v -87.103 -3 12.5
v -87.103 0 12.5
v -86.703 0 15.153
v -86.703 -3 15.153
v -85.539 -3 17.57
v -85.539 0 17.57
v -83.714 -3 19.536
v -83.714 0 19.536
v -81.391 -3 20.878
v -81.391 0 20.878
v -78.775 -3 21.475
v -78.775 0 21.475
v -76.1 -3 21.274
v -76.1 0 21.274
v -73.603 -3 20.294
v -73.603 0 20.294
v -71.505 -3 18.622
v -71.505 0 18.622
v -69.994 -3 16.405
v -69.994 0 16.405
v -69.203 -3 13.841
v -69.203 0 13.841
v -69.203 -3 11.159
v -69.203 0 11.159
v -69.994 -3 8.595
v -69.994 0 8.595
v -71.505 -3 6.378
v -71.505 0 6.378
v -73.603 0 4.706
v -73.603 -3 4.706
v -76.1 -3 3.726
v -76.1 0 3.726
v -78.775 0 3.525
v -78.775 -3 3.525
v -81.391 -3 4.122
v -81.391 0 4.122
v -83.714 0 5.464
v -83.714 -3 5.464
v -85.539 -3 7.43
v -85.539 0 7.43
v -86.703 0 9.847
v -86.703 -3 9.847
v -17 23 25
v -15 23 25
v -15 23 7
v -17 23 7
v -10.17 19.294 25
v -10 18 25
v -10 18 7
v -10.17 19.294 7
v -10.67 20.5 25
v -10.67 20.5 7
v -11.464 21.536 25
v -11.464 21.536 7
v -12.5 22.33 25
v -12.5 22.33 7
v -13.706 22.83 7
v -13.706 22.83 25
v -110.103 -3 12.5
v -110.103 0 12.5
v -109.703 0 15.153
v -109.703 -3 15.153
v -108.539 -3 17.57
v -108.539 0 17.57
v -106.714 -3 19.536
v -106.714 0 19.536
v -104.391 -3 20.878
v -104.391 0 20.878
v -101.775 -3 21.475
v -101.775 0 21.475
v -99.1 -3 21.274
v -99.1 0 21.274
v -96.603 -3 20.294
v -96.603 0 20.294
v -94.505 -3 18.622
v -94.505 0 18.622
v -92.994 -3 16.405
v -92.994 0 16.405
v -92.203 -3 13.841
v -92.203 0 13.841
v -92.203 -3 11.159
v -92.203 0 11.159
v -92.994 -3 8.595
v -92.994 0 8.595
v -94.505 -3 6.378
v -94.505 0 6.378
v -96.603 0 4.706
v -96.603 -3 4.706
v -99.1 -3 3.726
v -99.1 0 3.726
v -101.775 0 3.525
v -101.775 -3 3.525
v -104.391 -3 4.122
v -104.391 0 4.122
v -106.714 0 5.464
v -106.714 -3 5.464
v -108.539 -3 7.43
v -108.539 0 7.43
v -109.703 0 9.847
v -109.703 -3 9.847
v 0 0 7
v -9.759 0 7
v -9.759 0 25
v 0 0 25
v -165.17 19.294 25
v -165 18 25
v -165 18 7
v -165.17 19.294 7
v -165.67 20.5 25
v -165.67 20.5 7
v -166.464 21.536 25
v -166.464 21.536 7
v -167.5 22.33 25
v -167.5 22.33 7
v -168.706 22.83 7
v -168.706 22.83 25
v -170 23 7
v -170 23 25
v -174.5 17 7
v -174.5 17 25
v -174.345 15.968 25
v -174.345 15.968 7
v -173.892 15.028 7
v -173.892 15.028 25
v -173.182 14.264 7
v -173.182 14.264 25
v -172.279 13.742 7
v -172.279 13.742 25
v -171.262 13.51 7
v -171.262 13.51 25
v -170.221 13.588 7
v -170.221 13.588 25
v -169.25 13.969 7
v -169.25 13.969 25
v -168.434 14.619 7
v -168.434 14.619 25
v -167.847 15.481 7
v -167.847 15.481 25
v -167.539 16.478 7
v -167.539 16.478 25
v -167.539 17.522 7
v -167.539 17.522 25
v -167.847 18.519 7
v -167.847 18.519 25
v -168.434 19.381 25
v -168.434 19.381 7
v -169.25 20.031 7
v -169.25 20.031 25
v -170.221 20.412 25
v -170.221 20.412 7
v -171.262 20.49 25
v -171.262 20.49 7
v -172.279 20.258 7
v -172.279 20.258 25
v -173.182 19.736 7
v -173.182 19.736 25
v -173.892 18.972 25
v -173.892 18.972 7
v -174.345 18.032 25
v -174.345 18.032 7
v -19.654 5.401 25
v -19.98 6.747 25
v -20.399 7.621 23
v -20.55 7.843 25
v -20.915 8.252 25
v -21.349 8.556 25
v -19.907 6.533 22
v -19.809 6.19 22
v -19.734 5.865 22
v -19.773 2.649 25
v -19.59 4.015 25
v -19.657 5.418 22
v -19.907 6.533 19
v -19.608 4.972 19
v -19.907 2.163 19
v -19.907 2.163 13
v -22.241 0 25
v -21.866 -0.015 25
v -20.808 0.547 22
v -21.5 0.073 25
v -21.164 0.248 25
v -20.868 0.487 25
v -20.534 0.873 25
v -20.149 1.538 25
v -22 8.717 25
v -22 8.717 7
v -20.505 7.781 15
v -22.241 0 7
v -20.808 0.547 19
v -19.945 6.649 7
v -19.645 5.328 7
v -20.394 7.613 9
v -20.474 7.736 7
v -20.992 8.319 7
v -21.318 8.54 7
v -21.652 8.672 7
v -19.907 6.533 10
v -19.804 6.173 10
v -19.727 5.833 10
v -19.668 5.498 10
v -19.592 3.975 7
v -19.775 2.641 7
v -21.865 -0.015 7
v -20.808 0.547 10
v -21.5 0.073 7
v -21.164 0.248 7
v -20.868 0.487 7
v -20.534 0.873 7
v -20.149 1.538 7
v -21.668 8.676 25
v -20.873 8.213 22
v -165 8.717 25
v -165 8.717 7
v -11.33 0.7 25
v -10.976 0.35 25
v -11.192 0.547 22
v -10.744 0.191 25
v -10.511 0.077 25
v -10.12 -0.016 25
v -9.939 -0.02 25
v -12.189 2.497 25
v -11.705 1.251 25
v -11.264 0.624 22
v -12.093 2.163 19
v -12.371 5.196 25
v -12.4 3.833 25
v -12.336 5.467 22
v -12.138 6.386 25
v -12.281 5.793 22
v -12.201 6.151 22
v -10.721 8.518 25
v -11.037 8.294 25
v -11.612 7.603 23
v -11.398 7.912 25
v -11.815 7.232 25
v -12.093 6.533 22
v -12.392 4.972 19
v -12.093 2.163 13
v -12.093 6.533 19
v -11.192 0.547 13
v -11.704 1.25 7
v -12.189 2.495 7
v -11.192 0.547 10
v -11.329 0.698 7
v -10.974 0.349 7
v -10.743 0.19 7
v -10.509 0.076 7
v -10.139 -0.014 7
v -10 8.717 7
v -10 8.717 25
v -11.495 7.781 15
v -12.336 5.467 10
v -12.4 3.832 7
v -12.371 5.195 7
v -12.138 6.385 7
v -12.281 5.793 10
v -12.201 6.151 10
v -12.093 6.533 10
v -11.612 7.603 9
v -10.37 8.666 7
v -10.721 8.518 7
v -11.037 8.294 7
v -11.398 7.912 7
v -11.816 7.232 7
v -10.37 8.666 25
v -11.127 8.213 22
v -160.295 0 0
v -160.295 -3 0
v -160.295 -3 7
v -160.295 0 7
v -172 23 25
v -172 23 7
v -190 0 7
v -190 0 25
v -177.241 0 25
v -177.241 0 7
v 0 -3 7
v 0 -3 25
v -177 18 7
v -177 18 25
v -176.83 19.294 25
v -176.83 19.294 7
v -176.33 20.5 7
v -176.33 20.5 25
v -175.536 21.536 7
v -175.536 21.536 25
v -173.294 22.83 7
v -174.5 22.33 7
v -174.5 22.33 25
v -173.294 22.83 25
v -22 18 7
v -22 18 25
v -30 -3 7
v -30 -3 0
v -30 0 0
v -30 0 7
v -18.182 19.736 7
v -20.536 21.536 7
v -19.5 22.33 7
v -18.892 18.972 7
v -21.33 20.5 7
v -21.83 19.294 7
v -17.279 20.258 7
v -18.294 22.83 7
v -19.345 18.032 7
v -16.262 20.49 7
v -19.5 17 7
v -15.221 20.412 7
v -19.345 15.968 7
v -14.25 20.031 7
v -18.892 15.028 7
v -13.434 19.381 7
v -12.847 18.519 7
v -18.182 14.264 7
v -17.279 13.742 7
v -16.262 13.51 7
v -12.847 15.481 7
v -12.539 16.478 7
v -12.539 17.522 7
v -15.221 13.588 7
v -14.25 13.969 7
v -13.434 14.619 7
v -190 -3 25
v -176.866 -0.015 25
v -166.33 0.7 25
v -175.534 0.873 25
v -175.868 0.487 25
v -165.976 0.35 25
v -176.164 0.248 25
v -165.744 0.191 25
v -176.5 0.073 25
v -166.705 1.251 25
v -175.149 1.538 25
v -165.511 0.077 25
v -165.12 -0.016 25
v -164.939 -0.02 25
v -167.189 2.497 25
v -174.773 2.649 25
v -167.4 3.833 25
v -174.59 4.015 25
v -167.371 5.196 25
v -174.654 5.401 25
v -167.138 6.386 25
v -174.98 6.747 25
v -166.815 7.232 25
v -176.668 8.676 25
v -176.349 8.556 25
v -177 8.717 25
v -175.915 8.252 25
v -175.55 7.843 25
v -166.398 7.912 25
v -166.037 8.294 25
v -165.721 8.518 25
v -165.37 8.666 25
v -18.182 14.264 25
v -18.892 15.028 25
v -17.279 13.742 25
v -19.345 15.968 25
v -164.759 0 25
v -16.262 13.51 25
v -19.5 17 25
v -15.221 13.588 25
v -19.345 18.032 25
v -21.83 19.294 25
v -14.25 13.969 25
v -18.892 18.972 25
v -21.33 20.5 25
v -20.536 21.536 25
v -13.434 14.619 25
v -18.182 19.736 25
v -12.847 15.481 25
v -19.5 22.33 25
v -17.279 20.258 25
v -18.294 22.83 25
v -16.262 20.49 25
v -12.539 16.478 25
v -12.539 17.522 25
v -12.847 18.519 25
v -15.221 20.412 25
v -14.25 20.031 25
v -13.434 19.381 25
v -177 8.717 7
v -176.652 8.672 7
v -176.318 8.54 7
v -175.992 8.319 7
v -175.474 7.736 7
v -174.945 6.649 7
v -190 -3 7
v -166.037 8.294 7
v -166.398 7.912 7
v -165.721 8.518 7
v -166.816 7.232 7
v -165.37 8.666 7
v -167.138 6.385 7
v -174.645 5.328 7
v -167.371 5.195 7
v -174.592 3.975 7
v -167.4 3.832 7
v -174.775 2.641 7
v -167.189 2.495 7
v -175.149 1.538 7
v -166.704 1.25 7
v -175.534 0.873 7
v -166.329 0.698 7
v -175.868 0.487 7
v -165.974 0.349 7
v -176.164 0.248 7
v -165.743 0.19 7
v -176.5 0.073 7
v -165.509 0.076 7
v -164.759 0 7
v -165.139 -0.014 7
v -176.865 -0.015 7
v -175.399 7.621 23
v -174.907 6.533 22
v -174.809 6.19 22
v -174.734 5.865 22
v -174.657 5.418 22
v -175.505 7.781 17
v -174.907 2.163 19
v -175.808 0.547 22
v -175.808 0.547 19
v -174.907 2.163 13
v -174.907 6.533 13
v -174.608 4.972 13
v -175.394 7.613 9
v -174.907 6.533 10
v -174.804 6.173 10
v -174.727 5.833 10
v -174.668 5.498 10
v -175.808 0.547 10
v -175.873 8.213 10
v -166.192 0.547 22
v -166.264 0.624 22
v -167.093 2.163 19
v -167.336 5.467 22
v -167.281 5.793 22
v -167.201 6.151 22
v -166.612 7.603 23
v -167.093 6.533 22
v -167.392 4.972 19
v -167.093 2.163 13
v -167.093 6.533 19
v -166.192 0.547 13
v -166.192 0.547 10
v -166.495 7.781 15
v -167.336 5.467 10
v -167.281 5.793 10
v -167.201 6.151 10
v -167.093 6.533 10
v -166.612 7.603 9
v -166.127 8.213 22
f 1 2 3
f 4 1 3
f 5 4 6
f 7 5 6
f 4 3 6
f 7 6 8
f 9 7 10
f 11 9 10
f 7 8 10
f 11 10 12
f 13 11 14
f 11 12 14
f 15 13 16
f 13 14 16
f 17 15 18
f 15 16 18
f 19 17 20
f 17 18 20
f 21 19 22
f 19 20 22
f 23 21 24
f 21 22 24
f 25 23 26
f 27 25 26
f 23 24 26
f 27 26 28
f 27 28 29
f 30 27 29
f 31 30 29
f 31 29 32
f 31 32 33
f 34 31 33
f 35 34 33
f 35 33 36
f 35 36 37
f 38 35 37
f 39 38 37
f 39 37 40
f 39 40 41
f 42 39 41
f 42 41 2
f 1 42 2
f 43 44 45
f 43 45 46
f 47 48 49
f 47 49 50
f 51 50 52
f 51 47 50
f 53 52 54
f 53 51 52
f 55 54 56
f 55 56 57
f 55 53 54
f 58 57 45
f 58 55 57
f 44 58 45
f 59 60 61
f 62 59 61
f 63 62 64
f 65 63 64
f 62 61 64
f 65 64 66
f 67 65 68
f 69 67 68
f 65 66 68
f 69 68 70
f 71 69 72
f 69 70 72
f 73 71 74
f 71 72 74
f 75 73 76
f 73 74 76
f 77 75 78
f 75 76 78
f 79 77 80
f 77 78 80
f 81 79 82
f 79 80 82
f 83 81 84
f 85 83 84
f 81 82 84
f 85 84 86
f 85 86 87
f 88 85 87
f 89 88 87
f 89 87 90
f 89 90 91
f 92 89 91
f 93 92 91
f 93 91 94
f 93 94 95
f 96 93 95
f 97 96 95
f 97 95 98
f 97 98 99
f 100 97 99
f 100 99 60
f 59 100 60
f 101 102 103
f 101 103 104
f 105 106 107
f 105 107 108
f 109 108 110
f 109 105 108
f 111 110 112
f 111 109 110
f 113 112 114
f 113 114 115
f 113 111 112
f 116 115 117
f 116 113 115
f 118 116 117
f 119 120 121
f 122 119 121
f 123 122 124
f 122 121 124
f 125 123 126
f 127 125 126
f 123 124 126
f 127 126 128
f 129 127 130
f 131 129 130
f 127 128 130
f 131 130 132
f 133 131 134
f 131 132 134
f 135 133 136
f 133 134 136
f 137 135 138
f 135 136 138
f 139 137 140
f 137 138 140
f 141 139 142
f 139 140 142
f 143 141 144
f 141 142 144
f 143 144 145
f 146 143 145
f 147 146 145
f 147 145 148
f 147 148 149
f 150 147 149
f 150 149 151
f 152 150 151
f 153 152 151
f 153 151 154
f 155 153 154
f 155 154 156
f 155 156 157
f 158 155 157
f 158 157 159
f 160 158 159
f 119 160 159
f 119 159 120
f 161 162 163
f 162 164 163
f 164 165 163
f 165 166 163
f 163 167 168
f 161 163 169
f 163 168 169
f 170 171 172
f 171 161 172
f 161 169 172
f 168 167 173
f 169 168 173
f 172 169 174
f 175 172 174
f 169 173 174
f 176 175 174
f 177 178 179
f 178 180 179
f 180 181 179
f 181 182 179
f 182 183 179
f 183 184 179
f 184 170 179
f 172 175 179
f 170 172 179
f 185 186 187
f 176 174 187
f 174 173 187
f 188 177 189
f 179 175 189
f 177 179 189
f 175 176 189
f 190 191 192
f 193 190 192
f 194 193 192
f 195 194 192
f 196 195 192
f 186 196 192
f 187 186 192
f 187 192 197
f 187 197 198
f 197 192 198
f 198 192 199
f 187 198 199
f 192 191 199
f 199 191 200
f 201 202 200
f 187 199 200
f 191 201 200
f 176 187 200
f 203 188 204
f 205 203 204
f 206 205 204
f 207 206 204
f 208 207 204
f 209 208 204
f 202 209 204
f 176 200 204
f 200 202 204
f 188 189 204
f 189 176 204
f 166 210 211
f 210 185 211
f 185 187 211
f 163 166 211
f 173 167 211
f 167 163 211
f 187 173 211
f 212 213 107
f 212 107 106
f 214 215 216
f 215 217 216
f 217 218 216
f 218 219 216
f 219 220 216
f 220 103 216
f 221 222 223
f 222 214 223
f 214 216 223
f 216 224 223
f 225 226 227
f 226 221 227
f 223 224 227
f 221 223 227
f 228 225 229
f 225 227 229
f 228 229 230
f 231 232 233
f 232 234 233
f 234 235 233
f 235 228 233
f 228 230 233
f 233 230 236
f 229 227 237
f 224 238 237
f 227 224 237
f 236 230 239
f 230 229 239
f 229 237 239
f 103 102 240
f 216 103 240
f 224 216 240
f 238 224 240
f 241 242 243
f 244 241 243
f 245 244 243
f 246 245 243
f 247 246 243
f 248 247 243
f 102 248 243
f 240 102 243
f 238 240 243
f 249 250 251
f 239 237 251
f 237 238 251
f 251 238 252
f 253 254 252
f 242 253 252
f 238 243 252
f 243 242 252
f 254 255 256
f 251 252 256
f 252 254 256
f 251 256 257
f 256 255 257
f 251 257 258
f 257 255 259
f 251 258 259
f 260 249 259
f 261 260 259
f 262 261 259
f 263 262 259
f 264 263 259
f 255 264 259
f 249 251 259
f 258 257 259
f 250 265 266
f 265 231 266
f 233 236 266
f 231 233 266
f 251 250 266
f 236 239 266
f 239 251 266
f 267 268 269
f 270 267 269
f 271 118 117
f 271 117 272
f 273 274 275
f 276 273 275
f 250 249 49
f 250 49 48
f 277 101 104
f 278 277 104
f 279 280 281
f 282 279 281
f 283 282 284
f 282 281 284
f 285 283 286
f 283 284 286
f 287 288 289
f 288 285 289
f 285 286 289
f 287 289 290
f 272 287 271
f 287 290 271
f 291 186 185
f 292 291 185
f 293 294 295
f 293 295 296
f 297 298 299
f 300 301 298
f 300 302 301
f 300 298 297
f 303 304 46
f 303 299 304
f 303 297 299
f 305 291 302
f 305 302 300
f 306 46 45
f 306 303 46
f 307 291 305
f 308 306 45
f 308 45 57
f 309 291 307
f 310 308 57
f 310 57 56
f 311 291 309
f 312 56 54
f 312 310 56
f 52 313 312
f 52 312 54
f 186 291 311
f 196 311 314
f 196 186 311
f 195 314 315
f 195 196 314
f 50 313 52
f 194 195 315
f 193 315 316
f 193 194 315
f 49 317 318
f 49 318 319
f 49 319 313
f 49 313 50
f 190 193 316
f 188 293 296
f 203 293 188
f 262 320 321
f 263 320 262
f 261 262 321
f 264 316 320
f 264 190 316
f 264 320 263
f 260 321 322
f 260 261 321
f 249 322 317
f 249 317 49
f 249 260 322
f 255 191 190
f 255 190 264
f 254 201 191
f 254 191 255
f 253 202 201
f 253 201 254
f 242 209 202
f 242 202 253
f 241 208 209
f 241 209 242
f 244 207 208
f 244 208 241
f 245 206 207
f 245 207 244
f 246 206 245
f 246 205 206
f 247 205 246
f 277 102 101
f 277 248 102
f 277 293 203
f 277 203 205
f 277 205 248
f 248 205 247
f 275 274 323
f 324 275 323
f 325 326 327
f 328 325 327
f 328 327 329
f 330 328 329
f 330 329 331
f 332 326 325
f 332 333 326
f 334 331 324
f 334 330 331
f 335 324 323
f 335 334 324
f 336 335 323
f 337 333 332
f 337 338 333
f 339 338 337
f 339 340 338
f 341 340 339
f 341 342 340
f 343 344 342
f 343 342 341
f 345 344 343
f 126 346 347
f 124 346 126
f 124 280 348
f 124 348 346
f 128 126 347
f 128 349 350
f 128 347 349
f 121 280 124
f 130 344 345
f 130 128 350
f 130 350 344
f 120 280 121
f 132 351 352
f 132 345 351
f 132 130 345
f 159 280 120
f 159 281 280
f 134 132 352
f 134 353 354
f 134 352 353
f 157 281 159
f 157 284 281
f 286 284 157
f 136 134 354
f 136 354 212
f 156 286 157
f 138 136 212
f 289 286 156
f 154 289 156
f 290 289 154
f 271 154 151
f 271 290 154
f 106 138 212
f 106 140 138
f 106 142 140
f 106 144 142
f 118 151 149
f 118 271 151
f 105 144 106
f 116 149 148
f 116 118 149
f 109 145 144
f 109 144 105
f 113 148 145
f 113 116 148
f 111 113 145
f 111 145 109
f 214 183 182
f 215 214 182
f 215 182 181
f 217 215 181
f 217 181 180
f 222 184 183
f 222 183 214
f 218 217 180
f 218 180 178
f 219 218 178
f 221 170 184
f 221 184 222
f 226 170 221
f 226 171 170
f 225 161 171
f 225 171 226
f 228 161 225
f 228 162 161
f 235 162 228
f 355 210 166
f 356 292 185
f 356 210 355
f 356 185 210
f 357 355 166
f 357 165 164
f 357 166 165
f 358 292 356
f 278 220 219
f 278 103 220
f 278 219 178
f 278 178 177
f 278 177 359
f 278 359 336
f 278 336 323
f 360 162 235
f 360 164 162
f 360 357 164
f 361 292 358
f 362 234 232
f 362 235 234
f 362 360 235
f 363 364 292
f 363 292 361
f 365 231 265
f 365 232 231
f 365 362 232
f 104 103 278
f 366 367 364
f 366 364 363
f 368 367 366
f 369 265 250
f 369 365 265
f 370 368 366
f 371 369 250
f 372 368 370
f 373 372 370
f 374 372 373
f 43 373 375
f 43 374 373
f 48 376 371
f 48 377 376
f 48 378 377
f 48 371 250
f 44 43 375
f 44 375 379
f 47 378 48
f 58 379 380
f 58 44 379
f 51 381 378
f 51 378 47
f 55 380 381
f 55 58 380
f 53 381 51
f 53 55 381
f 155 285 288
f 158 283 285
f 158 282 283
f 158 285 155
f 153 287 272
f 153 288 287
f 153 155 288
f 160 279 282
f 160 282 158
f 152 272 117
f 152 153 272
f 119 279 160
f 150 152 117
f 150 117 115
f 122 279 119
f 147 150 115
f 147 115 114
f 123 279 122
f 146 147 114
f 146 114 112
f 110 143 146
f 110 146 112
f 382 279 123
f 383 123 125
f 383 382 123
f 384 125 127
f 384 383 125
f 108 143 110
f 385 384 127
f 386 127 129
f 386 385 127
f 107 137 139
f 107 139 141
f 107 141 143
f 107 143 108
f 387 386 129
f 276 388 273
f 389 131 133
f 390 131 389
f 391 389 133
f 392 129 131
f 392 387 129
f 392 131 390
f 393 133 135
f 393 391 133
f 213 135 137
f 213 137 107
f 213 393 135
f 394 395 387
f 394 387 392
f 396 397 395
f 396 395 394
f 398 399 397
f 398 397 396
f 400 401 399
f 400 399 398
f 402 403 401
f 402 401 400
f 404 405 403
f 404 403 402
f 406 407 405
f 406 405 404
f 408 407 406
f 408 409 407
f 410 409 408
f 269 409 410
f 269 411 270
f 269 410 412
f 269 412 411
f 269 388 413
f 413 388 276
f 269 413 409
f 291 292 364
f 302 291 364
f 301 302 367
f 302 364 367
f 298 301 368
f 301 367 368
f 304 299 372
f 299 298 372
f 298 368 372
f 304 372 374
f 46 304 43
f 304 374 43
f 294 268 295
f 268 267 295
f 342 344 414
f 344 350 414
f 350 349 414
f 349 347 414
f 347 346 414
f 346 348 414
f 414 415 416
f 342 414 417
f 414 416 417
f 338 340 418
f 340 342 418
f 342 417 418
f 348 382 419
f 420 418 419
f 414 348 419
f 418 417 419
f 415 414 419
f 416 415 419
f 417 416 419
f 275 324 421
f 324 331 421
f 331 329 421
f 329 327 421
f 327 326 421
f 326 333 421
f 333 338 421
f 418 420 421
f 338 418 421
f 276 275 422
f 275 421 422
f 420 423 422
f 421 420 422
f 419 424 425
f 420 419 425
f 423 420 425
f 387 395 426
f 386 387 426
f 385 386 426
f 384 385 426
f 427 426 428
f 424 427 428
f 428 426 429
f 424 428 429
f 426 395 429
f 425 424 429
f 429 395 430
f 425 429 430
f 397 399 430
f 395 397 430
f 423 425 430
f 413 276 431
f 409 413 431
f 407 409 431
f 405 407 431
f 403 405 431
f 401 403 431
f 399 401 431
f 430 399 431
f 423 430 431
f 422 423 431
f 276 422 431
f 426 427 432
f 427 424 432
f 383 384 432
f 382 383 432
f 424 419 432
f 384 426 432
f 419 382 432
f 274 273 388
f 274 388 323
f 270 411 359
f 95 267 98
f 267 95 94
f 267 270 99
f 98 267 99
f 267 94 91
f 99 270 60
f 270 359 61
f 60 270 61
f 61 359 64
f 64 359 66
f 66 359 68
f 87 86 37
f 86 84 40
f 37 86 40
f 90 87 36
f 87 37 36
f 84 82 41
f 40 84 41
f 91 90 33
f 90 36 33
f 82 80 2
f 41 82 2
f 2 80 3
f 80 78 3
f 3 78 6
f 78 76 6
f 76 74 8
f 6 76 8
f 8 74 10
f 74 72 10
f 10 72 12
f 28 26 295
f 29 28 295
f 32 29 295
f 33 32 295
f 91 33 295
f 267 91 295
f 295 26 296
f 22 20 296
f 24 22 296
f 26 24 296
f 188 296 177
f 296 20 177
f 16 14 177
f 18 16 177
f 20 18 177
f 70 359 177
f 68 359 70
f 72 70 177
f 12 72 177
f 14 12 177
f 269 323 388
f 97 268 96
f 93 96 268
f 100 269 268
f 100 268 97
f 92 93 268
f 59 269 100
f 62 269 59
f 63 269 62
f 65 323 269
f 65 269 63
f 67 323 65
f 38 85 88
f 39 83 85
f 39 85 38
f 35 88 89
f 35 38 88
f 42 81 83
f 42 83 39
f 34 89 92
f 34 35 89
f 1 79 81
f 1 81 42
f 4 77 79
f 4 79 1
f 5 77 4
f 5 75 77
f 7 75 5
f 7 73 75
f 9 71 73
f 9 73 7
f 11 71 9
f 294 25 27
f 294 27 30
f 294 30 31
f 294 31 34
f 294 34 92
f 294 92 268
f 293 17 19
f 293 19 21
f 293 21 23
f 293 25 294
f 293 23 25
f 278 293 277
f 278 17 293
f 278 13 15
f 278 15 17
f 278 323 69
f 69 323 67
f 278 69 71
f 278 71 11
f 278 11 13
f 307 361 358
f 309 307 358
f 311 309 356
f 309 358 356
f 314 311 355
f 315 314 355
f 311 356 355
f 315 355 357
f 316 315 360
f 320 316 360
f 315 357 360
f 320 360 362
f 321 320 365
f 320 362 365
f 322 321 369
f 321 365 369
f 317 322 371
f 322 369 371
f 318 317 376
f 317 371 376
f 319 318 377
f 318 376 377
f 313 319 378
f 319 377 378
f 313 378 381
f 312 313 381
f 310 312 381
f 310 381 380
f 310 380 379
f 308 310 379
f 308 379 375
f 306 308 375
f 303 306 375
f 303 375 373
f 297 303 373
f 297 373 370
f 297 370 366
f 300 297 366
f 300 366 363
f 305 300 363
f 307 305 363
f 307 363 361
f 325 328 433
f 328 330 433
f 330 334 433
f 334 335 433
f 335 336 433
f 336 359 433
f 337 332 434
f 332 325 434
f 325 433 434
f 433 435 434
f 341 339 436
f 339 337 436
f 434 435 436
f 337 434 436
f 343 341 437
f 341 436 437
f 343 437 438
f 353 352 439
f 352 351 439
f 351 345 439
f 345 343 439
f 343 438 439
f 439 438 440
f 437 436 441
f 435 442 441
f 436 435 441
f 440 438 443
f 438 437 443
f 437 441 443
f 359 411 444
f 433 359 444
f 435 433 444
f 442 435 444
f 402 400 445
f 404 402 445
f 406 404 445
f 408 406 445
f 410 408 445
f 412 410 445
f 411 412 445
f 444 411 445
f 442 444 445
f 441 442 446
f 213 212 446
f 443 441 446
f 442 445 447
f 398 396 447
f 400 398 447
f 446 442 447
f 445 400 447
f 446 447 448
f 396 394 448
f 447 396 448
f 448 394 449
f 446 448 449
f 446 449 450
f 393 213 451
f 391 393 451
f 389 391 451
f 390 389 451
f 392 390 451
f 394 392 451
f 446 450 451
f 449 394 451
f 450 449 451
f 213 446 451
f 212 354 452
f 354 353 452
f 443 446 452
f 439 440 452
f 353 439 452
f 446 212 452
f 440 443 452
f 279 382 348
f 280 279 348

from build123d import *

# Parameters (mm, degrees)
F0_W      = 190
F0_H      = 25
F1_DEPTH  = 3
F3_D      = 18
F4_D      = 18
F5_W      = 12
F5_H      = 25
F6_DEPTH  = 23
F7_R      = 5
F9_D      = 7
F11_DEPTH = 50
F12_DEPTH = 25.4
F13_W     = 30
F13_H     = 7
F13_W_2   = 29.7052872181
F14_DEPTH = 70


with BuildPart() as f1:
    # F0 (on Front) → F1 (new body)
    with BuildSketch(Plane.XZ):
        with Locations((-95, 12.5)):
            Rectangle(F0_W, F0_H)
    extrude(amount=F1_DEPTH)

    # F3 (through all)
    with Locations(Plane.XZ.offset(3)):
        with Locations((-78.1028885841, 12.5)):
            Hole(F3_D / 2)

    # F4 (through all)
    with Locations(Plane.XZ.offset(3)):
        with Locations((-101.1028885841, 12.5)):
            Hole(F4_D / 2)

    # F5 (on face) → F6 (join)
    with BuildSketch(Plane(origin=(0, 0, 0), x_dir=(-1, 0, 0), z_dir=(0, 1, 0))):
        with Locations((171, 12.5)):
            Rectangle(F5_W, F5_H)
        with Locations((16, 12.5)):
            Rectangle(F5_W, F5_H)
    extrude(amount=F6_DEPTH)

    # F7
    f7_edges = [f1.edges().sort_by_distance(p)[0] for p in [
        (-10, 23, 12.5),
        (-22, 23, 12.5),
        (-165, 23, 12.5),
        (-177, 23, 12.5),
    ]]
    fillet(f7_edges, radius=F7_R)

    # F9 (through all)
    with Locations(Plane(origin=(0, 0, 0), x_dir=(1, 0, 0), z_dir=(0, 0, -1))):
        with Locations((-16, -17), (-171, -17)):
            Hole(F9_D / 2)

    # F10 (on face) → F11 (cut)
    with BuildSketch(Plane(origin=(0, 0, 0), x_dir=(1, 0, 0), z_dir=(0, 0, -1))):
        with BuildLine():
            Line((-10, 0), (-10, -8.7173189968))
            add(Edge.make_bspline(
                [(-10, -8.7173189968), (-7.7008124763, -8.7173189968), (-7.5862252656, -4.5655746788), (-7.4716380548, -0.4138303608), (-9.7594039535, 0)],
                knots=[0, 0, 0, 1.5209375403, 1.5209375403, 3.0418750806, 3.0418750806, 3.0418750806], degree=2, weights=[1, 0.7245129853, 1, 0.7245129853, 1]))
            Line((-9.7594039535, 0), (-10, 0))
        make_face()
        with BuildLine():
            add(Edge.make_bspline(
                [(-22.2405960465, 0), (-24.5283619452, -0.4138303608), (-24.4137747344, -4.5655746788), (-24.2991875237, -8.7173189968), (-22, -8.7173189968)],
                knots=[3.2413102266, 3.2413102266, 3.2413102266, 4.7622477669, 4.7622477669, 6.2831853072, 6.2831853072, 6.2831853072], degree=2, weights=[1, 0.7245129853, 1, 0.7245129853, 1]))
            Line((-22, -8.7173189968), (-22, 0))
            Line((-22, 0), (-22.2405960465, 0))
        make_face()
        with BuildLine():
            add(Edge.make_bspline(
                [(-165, -8.7173189968), (-162.7008124763, -8.7173189968), (-162.5862252656, -4.5655746788), (-162.4716380548, -0.4138303608), (-164.7594039535, 0)],
                knots=[0, 0, 0, 1.5209375403, 1.5209375403, 3.0418750806, 3.0418750806, 3.0418750806], degree=2, weights=[1, 0.7245129853, 1, 0.7245129853, 1]))
            Line((-164.7594039535, 0), (-165, 0))
            Line((-165, 0), (-165, -8.7173189968))
        make_face()
        with BuildLine():
            add(Edge.make_bspline(
                [(-177.2405960465, 0), (-179.5283619452, -0.4138303608), (-179.4137747344, -4.5655746788), (-179.2991875237, -8.7173189968), (-177, -8.7173189968)],
                knots=[3.2413102266, 3.2413102266, 3.2413102266, 4.7622477669, 4.7622477669, 6.2831853072, 6.2831853072, 6.2831853072], degree=2, weights=[1, 0.7245129853, 1, 0.7245129853, 1]))
            Line((-177, -8.7173189968), (-177, 0))
            Line((-177, 0), (-177.2405960465, 0))
        make_face()
    extrude(amount=-F11_DEPTH, mode=Mode.SUBTRACT)

    # F10 (on face) → F12 (cut)
    with BuildSketch(Plane(origin=(0, 0, 0), x_dir=(1, 0, 0), z_dir=(0, 0, -1))):
        with BuildLine():
            add(Edge.make_bspline(
                [(-22, -8.7173189968), (-17.8140176358, -8.7173189968), (-19.9070088179, -2.1630499978), (-22, 4.3912190013), (-24.0929911821, -2.1630499978), (-26.1859823642, -8.7173189968), (-22, -8.7173189968)],
                knots=[0, 0, 0, 2.0943951024, 2.0943951024, 4.1887902048, 4.1887902048, 6.2831853072, 6.2831853072, 6.2831853072], degree=2, weights=[1, 0.5, 1, 0.5, 1, 0.5, 1]))
        make_face()
        with BuildLine():
            add(Edge.make_bspline(
                [(-10, -8.7173189968), (-5.8140176358, -8.7173189968), (-7.9070088179, -2.1630499978), (-10, 4.3912190013), (-12.0929911821, -2.1630499978), (-14.1859823642, -8.7173189968), (-10, -8.7173189968)],
                knots=[0, 0, 0, 2.0943951024, 2.0943951024, 4.1887902048, 4.1887902048, 6.2831853072, 6.2831853072, 6.2831853072], degree=2, weights=[1, 0.5, 1, 0.5, 1, 0.5, 1]))
        make_face()
        with BuildLine():
            add(Edge.make_bspline(
                [(-177, -8.7173189968), (-172.8140176358, -8.7173189968), (-174.9070088179, -2.1630499978), (-177, 4.3912190013), (-179.0929911821, -2.1630499978), (-181.1859823642, -8.7173189968), (-177, -8.7173189968)],
                knots=[0, 0, 0, 2.0943951024, 2.0943951024, 4.1887902048, 4.1887902048, 6.2831853072, 6.2831853072, 6.2831853072], degree=2, weights=[1, 0.5, 1, 0.5, 1, 0.5, 1]))
        make_face()
        with BuildLine():
            add(Edge.make_bspline(
                [(-165, -8.7173189968), (-160.8140176358, -8.7173189968), (-162.9070088179, -2.1630499978), (-165, 4.3912190013), (-167.0929911821, -2.1630499978), (-169.1859823642, -8.7173189968), (-165, -8.7173189968)],
                knots=[0, 0, 0, 2.0943951024, 2.0943951024, 4.1887902048, 4.1887902048, 6.2831853072, 6.2831853072, 6.2831853072], degree=2, weights=[1, 0.5, 1, 0.5, 1, 0.5, 1]))
        make_face()
    extrude(amount=-F12_DEPTH, mode=Mode.SUBTRACT)

    # F13 (on face) → F14 (cut)
    with BuildSketch(Plane.XZ.offset(3)):
        with Locations((-15, 3.5)):
            Rectangle(F13_W, F13_H)
        with Locations((-175.147356391, 3.5)):
            Rectangle(F13_W_2, F13_H)
    extrude(amount=-F14_DEPTH, mode=Mode.SUBTRACT)


solid = f1.part
